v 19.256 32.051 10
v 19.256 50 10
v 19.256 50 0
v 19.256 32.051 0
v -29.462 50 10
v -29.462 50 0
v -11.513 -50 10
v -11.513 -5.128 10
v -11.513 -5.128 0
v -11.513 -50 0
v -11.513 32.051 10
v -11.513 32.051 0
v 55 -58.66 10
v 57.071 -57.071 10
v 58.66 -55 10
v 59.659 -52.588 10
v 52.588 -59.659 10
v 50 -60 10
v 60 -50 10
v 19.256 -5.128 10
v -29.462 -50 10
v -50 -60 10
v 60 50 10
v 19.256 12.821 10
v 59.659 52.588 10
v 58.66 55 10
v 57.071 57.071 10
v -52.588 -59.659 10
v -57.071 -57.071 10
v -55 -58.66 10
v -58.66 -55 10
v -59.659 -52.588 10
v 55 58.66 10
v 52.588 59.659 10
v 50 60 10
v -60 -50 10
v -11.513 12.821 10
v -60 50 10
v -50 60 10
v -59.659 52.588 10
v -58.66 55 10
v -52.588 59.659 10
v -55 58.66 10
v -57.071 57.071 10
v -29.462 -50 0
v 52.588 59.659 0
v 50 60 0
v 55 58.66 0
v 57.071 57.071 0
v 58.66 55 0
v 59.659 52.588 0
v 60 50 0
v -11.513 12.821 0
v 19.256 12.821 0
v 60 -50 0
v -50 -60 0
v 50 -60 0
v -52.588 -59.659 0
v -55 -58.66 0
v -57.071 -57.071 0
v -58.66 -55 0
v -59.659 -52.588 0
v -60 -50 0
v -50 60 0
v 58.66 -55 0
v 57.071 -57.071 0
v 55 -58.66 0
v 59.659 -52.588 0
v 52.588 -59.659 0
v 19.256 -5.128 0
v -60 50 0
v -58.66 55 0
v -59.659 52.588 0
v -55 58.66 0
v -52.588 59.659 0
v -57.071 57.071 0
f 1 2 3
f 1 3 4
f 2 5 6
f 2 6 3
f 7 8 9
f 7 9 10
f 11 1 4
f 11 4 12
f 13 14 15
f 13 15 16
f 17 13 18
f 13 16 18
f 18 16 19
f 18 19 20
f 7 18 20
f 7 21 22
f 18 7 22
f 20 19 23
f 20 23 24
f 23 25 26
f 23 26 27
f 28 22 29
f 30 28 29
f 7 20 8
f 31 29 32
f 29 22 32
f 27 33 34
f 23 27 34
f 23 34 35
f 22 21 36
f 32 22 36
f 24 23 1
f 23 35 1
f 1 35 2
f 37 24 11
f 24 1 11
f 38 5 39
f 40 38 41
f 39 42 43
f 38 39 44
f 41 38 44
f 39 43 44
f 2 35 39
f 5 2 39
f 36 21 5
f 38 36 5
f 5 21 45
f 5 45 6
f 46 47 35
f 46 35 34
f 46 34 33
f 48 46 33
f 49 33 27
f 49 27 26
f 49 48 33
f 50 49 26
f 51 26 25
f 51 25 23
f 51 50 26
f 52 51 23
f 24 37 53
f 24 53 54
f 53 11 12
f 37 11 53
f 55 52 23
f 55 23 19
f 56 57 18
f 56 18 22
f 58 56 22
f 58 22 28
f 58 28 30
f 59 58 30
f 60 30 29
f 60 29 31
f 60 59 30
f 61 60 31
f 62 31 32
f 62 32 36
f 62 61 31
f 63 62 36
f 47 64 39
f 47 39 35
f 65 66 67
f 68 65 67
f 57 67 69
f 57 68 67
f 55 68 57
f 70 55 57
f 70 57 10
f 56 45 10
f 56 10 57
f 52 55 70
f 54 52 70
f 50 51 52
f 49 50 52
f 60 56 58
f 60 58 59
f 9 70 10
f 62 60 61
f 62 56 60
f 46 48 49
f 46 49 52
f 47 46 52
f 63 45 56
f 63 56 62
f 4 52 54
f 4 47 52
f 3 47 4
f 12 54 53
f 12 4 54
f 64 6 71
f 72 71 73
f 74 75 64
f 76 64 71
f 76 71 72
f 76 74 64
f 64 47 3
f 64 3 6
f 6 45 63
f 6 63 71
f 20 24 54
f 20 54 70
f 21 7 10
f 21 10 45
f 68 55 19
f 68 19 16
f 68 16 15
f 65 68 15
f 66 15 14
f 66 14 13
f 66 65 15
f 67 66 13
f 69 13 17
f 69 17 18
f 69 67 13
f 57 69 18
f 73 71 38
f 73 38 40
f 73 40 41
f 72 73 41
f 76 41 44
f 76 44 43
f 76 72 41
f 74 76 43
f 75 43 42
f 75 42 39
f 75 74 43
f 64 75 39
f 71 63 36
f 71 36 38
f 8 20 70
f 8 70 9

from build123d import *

# Parameters (mm, degrees)
BOSS_EXTRUDE1_DEPTH = 10
CUT_EXTRUDE19_DEPTH = 10


with BuildPart() as part:
    # Sketch1 → Boss-Extrude1 (new body)
    with BuildSketch(Plane.XY):
        with BuildLine():
            Line((-50, 60), (50, 60))
            ThreePointArc((50, 60), (57.071067812, 57.071067812), (60, 50))
            Line((60, 50), (60, -50))
            ThreePointArc((60, -50), (57.071067812, -57.071067812), (50, -60))
            Line((50, -60), (-50, -60))
            ThreePointArc((-50, -60), (-57.071067812, -57.071067812), (-60, -50))
            Line((-60, -50), (-60, 50))
            ThreePointArc((-60, 50), (-57.071067812, 57.071067812), (-50, 60))
        make_face()
    extrude(amount=BOSS_EXTRUDE1_DEPTH)

    # Sketch2 → Cut-Extrude19 (cut)
    with BuildSketch(Plane.XY.offset(10)):
        Polygon((-29.461538462, 50), (19.256410256, 50), (19.256410256, 32.051282051), (-11.512820513, 32.051282051), (-11.512820513, 12.820512821), (19.256410256, 12.820512821), (19.256410256, -5.128205128), (-11.512820513, -5.128205128), (-11.512820513, -50), (-29.461538462, -50), align=None)
    extrude(amount=-CUT_EXTRUDE19_DEPTH, mode=Mode.SUBTRACT)


solid = part.part
